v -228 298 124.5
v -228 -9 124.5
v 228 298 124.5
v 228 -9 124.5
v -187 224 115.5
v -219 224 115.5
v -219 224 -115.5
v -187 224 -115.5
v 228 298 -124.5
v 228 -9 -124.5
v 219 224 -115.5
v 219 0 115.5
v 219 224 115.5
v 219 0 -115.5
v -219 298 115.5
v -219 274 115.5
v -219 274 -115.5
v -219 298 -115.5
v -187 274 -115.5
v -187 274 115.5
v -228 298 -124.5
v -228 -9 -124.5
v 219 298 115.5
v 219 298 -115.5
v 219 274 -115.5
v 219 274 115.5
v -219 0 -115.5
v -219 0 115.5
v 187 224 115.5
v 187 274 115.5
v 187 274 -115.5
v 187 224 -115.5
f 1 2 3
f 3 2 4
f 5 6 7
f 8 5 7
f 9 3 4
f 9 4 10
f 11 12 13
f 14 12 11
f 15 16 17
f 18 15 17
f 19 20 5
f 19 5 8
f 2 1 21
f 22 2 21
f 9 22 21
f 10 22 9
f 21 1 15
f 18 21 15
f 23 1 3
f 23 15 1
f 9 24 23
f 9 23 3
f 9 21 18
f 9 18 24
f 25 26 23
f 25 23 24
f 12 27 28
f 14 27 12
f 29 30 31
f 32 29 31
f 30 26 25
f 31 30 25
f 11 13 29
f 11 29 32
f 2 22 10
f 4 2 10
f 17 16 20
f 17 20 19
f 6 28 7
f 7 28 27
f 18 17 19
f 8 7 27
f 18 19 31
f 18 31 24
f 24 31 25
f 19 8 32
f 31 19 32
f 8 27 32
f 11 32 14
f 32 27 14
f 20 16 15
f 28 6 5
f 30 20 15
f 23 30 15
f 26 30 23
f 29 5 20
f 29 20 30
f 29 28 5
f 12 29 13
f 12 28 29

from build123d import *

# Parameters (mm, degrees)
SKETCH1_W           = 456
SKETCH1_H           = 249
SKETCH1_W_2         = 438
SKETCH1_H_2         = 231
BOSS_EXTRUDE1_DEPTH = 9
SKETCH1_3_W         = 456
SKETCH1_3_H         = 249
SKETCH1_3_W_2       = 438
SKETCH1_3_H_2       = 231
BOSS_EXTRUDE2_DEPTH = 298
SKETCH3_W           = 231
SKETCH3_H           = 50
BOSS_EXTRUDE3_DEPTH = 32


with BuildPart() as part:
    # Sketch1 → Boss-Extrude1 (new body)
    with BuildSketch(Plane(origin=(0, 0, 0), x_dir=(1, 0, 0), z_dir=(0, 1, 0))):
        Rectangle(SKETCH1_W, SKETCH1_H)
        Rectangle(SKETCH1_W_2, SKETCH1_H_2, mode=Mode.SUBTRACT)
        Rectangle(SKETCH1_W_2, SKETCH1_H_2)
    extrude(amount=-BOSS_EXTRUDE1_DEPTH)

    # Sketch1<3> → Boss-Extrude2 (add)
    with BuildSketch(Plane(origin=(0, 0, 0), x_dir=(1, 0, 0), z_dir=(0, 1, 0))):
        Rectangle(SKETCH1_3_W, SKETCH1_3_H)
        Rectangle(SKETCH1_3_W_2, SKETCH1_3_H_2, mode=Mode.SUBTRACT)
    extrude(amount=BOSS_EXTRUDE2_DEPTH)

    # Sketch3 → Boss-Extrude3 (add)
    with BuildSketch(Plane(origin=(-219, 0, 0), x_dir=(0, 0, -1), z_dir=(1, 0, 0))):
        with Locations((0, 249)):
            Rectangle(SKETCH3_W, SKETCH3_H)
    boss_extrude3 = extrude(amount=BOSS_EXTRUDE3_DEPTH)

    # Mirror1: Boss-Extrude3 across plane
    add(boss_extrude3.mirror(Plane(origin=(0, 0, 0), x_dir=(0, 0, 1), z_dir=(1, 0, 0))))


solid = part.part
